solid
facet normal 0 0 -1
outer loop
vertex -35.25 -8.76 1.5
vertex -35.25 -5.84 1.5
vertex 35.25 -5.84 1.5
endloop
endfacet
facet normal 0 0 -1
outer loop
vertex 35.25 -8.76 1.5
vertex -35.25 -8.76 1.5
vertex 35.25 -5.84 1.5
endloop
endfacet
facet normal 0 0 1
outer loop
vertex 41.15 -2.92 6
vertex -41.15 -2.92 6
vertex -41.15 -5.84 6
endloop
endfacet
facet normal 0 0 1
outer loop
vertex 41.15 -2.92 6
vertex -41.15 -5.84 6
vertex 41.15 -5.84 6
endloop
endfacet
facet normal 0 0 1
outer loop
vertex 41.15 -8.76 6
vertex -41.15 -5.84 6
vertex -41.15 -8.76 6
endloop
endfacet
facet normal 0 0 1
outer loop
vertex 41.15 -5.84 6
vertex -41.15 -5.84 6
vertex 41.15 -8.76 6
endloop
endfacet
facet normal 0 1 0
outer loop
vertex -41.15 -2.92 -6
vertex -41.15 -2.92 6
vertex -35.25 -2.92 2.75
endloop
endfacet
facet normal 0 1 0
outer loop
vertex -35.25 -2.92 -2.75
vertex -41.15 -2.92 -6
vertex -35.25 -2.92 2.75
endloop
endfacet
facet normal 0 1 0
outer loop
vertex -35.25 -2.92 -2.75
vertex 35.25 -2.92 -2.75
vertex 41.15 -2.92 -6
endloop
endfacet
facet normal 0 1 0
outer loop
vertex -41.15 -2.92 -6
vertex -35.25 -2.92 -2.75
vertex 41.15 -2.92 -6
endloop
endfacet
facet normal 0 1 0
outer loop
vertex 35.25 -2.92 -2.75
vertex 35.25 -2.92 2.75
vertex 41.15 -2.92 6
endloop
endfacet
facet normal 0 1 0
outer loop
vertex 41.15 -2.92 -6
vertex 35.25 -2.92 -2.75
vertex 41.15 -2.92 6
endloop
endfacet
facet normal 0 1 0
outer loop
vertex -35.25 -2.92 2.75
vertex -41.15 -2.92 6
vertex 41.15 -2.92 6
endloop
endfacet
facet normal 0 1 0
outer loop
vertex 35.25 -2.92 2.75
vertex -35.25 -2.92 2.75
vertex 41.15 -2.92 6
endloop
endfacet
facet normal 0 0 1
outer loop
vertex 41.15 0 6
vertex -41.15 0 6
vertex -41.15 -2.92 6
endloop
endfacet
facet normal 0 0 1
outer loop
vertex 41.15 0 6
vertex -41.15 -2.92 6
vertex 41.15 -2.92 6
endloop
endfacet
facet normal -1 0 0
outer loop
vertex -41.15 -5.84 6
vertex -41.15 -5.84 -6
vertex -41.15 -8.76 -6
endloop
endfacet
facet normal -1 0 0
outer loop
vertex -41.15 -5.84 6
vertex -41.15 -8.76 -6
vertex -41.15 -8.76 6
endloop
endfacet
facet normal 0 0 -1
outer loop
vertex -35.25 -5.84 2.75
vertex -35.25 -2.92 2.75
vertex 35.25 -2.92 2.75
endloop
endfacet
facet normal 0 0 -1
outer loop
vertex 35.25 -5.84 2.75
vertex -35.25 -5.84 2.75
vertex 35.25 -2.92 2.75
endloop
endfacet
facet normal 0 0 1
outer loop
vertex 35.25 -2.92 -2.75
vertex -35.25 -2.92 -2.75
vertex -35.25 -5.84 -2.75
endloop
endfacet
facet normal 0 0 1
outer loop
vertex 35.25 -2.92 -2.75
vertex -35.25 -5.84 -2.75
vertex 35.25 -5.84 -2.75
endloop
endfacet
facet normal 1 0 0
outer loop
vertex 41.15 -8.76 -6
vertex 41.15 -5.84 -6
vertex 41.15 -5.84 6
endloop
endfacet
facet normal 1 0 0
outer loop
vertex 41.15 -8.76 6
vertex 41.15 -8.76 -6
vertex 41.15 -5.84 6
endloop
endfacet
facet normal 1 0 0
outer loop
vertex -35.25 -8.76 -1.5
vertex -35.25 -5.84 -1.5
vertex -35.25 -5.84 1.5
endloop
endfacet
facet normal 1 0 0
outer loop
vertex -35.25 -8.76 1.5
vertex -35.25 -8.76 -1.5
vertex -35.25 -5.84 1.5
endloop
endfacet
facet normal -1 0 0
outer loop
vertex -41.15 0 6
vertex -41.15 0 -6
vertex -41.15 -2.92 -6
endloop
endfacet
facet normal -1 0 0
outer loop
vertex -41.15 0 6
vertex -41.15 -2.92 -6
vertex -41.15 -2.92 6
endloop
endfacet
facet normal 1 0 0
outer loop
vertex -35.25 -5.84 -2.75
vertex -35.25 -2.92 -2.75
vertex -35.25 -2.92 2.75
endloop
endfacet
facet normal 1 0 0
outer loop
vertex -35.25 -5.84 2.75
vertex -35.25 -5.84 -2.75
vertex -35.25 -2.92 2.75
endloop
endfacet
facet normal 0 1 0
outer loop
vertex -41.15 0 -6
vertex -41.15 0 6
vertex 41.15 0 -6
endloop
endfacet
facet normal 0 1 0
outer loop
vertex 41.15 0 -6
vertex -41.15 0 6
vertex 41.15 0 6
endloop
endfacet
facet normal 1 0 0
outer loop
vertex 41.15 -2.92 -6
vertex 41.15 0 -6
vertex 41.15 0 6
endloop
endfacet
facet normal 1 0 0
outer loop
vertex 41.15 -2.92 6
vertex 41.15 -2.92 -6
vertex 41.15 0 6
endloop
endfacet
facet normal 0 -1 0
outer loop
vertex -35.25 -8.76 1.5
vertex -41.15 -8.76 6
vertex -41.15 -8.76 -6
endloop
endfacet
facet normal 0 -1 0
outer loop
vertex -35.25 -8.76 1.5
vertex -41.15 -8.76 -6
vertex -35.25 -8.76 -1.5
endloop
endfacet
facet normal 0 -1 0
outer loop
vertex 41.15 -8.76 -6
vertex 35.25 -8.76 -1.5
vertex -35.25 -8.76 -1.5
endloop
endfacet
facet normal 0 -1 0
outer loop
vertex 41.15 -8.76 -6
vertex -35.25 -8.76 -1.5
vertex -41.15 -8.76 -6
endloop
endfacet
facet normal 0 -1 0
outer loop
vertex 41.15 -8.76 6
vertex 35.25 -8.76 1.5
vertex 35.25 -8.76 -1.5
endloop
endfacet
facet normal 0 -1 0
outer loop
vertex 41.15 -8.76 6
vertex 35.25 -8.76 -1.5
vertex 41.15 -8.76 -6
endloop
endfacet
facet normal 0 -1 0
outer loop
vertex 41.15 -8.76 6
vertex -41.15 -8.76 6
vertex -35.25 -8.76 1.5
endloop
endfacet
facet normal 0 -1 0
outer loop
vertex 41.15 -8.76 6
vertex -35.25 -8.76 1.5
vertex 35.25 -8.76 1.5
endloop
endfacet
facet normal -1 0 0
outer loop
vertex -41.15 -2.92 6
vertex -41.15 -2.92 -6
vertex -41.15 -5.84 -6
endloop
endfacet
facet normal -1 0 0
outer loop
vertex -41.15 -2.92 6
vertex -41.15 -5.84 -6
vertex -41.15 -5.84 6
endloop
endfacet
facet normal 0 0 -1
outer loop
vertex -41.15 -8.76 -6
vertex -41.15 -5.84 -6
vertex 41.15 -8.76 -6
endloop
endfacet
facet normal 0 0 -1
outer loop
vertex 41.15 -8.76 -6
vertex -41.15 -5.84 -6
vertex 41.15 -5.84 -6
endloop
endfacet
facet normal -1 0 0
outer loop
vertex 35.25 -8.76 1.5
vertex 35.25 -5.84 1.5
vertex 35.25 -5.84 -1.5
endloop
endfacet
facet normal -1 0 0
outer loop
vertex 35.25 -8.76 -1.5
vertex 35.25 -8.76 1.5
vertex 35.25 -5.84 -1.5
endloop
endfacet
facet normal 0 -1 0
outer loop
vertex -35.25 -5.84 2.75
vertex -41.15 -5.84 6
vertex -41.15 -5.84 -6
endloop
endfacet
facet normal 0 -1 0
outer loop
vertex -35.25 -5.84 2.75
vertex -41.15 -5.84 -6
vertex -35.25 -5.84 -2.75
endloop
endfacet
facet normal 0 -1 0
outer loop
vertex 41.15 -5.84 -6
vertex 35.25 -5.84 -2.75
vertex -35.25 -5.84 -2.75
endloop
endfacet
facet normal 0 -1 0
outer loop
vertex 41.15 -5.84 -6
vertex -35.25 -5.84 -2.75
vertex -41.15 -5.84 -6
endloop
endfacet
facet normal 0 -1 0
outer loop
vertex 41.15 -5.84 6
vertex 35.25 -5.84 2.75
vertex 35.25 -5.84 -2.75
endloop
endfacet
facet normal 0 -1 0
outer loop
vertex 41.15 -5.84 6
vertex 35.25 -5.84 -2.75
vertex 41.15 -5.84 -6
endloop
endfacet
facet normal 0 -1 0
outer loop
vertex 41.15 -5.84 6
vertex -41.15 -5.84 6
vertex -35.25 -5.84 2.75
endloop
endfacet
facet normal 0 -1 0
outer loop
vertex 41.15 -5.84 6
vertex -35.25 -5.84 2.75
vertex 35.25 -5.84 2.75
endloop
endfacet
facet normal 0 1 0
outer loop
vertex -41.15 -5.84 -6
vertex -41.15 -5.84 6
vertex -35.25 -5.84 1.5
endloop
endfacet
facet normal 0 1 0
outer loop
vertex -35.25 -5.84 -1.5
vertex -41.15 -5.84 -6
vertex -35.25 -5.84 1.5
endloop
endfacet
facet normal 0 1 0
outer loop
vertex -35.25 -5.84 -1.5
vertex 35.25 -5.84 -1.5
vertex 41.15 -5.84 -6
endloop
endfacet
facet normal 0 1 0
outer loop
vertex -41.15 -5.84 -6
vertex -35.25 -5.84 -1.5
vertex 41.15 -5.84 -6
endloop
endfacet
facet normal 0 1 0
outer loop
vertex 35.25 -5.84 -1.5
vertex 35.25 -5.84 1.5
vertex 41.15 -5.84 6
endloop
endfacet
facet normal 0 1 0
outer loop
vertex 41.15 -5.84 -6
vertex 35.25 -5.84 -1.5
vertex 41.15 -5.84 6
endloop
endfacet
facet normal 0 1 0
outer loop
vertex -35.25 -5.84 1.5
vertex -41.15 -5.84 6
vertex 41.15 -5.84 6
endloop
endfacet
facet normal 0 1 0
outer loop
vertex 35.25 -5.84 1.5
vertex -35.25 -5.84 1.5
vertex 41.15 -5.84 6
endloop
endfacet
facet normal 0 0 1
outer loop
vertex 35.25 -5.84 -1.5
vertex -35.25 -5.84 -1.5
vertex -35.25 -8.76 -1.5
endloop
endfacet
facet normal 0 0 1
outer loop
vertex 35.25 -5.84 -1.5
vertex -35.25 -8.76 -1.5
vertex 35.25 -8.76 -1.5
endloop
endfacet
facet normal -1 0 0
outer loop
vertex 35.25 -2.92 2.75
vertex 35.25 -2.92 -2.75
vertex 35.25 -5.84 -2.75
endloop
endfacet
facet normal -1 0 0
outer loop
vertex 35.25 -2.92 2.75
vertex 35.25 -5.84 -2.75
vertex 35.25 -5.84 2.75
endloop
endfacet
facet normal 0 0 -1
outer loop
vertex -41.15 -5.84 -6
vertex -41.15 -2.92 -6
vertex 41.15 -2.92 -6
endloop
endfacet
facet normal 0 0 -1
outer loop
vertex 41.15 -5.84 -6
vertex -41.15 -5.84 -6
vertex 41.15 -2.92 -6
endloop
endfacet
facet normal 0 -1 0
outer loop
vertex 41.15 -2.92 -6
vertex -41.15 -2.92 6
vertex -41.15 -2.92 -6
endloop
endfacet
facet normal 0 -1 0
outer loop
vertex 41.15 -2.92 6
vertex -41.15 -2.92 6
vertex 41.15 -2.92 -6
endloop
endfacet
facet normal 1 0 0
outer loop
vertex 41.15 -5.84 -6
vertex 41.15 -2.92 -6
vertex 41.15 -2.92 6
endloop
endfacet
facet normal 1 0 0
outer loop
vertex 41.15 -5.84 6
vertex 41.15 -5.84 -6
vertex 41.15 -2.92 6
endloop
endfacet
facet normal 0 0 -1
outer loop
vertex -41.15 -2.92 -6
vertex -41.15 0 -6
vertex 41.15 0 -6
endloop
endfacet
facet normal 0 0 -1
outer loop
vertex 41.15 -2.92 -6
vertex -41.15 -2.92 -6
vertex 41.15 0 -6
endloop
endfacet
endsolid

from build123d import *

# Parameters (mm, degrees)
F0_W     = 82.3
F0_H     = 12
F1_DEPTH = 2.92
F2_W     = 82.3
F2_H     = 12
F2_W_2   = 70.5
F2_H_2   = 5.5
F3_DEPTH = 2.92
F4_W     = 82.3
F4_H     = 12
F4_W_2   = 70.5
F4_H_2   = 1.25
F5_DEPTH = 2.92


# Not quite as in the source:
# - a feature names something its author has since deleted; it is built from what else it names


with BuildPart() as f1:
    # F0 (on Front) → F1 (new body)
    with BuildSketch(Plane.XZ):
        Rectangle(F0_W, F0_H)
    extrude(amount=F1_DEPTH)


with BuildPart() as f3:
    # F2 (on face) → F3 (new body)
    with BuildSketch(Plane.XZ.offset(2.92)):
        Rectangle(F2_W, F2_H)
        Rectangle(F2_W_2, F2_H_2, mode=Mode.SUBTRACT)
    extrude(amount=F3_DEPTH)


with BuildPart() as f5:
    # F4 (on face) → F5 (new body)
    with BuildSketch(Plane.XZ.offset(5.84)):
        Rectangle(F4_W, F4_H)
        Polygon((35.25, 1.5), (35.25, -1.5), (35.25, -2.75), (-35.25, -2.75), (-35.25, -1.5), (-35.25, 1.5), (-35.25, 2.75), (35.25, 2.75), align=None, mode=Mode.SUBTRACT)
        with Locations((0, 2.125)):
            Rectangle(F4_W_2, F4_H_2)
        with Locations((0, -2.125)):
            Rectangle(F4_W_2, F4_H_2)
    extrude(amount=F5_DEPTH)


solid = Compound([f1.part, f3.part, f5.part])
